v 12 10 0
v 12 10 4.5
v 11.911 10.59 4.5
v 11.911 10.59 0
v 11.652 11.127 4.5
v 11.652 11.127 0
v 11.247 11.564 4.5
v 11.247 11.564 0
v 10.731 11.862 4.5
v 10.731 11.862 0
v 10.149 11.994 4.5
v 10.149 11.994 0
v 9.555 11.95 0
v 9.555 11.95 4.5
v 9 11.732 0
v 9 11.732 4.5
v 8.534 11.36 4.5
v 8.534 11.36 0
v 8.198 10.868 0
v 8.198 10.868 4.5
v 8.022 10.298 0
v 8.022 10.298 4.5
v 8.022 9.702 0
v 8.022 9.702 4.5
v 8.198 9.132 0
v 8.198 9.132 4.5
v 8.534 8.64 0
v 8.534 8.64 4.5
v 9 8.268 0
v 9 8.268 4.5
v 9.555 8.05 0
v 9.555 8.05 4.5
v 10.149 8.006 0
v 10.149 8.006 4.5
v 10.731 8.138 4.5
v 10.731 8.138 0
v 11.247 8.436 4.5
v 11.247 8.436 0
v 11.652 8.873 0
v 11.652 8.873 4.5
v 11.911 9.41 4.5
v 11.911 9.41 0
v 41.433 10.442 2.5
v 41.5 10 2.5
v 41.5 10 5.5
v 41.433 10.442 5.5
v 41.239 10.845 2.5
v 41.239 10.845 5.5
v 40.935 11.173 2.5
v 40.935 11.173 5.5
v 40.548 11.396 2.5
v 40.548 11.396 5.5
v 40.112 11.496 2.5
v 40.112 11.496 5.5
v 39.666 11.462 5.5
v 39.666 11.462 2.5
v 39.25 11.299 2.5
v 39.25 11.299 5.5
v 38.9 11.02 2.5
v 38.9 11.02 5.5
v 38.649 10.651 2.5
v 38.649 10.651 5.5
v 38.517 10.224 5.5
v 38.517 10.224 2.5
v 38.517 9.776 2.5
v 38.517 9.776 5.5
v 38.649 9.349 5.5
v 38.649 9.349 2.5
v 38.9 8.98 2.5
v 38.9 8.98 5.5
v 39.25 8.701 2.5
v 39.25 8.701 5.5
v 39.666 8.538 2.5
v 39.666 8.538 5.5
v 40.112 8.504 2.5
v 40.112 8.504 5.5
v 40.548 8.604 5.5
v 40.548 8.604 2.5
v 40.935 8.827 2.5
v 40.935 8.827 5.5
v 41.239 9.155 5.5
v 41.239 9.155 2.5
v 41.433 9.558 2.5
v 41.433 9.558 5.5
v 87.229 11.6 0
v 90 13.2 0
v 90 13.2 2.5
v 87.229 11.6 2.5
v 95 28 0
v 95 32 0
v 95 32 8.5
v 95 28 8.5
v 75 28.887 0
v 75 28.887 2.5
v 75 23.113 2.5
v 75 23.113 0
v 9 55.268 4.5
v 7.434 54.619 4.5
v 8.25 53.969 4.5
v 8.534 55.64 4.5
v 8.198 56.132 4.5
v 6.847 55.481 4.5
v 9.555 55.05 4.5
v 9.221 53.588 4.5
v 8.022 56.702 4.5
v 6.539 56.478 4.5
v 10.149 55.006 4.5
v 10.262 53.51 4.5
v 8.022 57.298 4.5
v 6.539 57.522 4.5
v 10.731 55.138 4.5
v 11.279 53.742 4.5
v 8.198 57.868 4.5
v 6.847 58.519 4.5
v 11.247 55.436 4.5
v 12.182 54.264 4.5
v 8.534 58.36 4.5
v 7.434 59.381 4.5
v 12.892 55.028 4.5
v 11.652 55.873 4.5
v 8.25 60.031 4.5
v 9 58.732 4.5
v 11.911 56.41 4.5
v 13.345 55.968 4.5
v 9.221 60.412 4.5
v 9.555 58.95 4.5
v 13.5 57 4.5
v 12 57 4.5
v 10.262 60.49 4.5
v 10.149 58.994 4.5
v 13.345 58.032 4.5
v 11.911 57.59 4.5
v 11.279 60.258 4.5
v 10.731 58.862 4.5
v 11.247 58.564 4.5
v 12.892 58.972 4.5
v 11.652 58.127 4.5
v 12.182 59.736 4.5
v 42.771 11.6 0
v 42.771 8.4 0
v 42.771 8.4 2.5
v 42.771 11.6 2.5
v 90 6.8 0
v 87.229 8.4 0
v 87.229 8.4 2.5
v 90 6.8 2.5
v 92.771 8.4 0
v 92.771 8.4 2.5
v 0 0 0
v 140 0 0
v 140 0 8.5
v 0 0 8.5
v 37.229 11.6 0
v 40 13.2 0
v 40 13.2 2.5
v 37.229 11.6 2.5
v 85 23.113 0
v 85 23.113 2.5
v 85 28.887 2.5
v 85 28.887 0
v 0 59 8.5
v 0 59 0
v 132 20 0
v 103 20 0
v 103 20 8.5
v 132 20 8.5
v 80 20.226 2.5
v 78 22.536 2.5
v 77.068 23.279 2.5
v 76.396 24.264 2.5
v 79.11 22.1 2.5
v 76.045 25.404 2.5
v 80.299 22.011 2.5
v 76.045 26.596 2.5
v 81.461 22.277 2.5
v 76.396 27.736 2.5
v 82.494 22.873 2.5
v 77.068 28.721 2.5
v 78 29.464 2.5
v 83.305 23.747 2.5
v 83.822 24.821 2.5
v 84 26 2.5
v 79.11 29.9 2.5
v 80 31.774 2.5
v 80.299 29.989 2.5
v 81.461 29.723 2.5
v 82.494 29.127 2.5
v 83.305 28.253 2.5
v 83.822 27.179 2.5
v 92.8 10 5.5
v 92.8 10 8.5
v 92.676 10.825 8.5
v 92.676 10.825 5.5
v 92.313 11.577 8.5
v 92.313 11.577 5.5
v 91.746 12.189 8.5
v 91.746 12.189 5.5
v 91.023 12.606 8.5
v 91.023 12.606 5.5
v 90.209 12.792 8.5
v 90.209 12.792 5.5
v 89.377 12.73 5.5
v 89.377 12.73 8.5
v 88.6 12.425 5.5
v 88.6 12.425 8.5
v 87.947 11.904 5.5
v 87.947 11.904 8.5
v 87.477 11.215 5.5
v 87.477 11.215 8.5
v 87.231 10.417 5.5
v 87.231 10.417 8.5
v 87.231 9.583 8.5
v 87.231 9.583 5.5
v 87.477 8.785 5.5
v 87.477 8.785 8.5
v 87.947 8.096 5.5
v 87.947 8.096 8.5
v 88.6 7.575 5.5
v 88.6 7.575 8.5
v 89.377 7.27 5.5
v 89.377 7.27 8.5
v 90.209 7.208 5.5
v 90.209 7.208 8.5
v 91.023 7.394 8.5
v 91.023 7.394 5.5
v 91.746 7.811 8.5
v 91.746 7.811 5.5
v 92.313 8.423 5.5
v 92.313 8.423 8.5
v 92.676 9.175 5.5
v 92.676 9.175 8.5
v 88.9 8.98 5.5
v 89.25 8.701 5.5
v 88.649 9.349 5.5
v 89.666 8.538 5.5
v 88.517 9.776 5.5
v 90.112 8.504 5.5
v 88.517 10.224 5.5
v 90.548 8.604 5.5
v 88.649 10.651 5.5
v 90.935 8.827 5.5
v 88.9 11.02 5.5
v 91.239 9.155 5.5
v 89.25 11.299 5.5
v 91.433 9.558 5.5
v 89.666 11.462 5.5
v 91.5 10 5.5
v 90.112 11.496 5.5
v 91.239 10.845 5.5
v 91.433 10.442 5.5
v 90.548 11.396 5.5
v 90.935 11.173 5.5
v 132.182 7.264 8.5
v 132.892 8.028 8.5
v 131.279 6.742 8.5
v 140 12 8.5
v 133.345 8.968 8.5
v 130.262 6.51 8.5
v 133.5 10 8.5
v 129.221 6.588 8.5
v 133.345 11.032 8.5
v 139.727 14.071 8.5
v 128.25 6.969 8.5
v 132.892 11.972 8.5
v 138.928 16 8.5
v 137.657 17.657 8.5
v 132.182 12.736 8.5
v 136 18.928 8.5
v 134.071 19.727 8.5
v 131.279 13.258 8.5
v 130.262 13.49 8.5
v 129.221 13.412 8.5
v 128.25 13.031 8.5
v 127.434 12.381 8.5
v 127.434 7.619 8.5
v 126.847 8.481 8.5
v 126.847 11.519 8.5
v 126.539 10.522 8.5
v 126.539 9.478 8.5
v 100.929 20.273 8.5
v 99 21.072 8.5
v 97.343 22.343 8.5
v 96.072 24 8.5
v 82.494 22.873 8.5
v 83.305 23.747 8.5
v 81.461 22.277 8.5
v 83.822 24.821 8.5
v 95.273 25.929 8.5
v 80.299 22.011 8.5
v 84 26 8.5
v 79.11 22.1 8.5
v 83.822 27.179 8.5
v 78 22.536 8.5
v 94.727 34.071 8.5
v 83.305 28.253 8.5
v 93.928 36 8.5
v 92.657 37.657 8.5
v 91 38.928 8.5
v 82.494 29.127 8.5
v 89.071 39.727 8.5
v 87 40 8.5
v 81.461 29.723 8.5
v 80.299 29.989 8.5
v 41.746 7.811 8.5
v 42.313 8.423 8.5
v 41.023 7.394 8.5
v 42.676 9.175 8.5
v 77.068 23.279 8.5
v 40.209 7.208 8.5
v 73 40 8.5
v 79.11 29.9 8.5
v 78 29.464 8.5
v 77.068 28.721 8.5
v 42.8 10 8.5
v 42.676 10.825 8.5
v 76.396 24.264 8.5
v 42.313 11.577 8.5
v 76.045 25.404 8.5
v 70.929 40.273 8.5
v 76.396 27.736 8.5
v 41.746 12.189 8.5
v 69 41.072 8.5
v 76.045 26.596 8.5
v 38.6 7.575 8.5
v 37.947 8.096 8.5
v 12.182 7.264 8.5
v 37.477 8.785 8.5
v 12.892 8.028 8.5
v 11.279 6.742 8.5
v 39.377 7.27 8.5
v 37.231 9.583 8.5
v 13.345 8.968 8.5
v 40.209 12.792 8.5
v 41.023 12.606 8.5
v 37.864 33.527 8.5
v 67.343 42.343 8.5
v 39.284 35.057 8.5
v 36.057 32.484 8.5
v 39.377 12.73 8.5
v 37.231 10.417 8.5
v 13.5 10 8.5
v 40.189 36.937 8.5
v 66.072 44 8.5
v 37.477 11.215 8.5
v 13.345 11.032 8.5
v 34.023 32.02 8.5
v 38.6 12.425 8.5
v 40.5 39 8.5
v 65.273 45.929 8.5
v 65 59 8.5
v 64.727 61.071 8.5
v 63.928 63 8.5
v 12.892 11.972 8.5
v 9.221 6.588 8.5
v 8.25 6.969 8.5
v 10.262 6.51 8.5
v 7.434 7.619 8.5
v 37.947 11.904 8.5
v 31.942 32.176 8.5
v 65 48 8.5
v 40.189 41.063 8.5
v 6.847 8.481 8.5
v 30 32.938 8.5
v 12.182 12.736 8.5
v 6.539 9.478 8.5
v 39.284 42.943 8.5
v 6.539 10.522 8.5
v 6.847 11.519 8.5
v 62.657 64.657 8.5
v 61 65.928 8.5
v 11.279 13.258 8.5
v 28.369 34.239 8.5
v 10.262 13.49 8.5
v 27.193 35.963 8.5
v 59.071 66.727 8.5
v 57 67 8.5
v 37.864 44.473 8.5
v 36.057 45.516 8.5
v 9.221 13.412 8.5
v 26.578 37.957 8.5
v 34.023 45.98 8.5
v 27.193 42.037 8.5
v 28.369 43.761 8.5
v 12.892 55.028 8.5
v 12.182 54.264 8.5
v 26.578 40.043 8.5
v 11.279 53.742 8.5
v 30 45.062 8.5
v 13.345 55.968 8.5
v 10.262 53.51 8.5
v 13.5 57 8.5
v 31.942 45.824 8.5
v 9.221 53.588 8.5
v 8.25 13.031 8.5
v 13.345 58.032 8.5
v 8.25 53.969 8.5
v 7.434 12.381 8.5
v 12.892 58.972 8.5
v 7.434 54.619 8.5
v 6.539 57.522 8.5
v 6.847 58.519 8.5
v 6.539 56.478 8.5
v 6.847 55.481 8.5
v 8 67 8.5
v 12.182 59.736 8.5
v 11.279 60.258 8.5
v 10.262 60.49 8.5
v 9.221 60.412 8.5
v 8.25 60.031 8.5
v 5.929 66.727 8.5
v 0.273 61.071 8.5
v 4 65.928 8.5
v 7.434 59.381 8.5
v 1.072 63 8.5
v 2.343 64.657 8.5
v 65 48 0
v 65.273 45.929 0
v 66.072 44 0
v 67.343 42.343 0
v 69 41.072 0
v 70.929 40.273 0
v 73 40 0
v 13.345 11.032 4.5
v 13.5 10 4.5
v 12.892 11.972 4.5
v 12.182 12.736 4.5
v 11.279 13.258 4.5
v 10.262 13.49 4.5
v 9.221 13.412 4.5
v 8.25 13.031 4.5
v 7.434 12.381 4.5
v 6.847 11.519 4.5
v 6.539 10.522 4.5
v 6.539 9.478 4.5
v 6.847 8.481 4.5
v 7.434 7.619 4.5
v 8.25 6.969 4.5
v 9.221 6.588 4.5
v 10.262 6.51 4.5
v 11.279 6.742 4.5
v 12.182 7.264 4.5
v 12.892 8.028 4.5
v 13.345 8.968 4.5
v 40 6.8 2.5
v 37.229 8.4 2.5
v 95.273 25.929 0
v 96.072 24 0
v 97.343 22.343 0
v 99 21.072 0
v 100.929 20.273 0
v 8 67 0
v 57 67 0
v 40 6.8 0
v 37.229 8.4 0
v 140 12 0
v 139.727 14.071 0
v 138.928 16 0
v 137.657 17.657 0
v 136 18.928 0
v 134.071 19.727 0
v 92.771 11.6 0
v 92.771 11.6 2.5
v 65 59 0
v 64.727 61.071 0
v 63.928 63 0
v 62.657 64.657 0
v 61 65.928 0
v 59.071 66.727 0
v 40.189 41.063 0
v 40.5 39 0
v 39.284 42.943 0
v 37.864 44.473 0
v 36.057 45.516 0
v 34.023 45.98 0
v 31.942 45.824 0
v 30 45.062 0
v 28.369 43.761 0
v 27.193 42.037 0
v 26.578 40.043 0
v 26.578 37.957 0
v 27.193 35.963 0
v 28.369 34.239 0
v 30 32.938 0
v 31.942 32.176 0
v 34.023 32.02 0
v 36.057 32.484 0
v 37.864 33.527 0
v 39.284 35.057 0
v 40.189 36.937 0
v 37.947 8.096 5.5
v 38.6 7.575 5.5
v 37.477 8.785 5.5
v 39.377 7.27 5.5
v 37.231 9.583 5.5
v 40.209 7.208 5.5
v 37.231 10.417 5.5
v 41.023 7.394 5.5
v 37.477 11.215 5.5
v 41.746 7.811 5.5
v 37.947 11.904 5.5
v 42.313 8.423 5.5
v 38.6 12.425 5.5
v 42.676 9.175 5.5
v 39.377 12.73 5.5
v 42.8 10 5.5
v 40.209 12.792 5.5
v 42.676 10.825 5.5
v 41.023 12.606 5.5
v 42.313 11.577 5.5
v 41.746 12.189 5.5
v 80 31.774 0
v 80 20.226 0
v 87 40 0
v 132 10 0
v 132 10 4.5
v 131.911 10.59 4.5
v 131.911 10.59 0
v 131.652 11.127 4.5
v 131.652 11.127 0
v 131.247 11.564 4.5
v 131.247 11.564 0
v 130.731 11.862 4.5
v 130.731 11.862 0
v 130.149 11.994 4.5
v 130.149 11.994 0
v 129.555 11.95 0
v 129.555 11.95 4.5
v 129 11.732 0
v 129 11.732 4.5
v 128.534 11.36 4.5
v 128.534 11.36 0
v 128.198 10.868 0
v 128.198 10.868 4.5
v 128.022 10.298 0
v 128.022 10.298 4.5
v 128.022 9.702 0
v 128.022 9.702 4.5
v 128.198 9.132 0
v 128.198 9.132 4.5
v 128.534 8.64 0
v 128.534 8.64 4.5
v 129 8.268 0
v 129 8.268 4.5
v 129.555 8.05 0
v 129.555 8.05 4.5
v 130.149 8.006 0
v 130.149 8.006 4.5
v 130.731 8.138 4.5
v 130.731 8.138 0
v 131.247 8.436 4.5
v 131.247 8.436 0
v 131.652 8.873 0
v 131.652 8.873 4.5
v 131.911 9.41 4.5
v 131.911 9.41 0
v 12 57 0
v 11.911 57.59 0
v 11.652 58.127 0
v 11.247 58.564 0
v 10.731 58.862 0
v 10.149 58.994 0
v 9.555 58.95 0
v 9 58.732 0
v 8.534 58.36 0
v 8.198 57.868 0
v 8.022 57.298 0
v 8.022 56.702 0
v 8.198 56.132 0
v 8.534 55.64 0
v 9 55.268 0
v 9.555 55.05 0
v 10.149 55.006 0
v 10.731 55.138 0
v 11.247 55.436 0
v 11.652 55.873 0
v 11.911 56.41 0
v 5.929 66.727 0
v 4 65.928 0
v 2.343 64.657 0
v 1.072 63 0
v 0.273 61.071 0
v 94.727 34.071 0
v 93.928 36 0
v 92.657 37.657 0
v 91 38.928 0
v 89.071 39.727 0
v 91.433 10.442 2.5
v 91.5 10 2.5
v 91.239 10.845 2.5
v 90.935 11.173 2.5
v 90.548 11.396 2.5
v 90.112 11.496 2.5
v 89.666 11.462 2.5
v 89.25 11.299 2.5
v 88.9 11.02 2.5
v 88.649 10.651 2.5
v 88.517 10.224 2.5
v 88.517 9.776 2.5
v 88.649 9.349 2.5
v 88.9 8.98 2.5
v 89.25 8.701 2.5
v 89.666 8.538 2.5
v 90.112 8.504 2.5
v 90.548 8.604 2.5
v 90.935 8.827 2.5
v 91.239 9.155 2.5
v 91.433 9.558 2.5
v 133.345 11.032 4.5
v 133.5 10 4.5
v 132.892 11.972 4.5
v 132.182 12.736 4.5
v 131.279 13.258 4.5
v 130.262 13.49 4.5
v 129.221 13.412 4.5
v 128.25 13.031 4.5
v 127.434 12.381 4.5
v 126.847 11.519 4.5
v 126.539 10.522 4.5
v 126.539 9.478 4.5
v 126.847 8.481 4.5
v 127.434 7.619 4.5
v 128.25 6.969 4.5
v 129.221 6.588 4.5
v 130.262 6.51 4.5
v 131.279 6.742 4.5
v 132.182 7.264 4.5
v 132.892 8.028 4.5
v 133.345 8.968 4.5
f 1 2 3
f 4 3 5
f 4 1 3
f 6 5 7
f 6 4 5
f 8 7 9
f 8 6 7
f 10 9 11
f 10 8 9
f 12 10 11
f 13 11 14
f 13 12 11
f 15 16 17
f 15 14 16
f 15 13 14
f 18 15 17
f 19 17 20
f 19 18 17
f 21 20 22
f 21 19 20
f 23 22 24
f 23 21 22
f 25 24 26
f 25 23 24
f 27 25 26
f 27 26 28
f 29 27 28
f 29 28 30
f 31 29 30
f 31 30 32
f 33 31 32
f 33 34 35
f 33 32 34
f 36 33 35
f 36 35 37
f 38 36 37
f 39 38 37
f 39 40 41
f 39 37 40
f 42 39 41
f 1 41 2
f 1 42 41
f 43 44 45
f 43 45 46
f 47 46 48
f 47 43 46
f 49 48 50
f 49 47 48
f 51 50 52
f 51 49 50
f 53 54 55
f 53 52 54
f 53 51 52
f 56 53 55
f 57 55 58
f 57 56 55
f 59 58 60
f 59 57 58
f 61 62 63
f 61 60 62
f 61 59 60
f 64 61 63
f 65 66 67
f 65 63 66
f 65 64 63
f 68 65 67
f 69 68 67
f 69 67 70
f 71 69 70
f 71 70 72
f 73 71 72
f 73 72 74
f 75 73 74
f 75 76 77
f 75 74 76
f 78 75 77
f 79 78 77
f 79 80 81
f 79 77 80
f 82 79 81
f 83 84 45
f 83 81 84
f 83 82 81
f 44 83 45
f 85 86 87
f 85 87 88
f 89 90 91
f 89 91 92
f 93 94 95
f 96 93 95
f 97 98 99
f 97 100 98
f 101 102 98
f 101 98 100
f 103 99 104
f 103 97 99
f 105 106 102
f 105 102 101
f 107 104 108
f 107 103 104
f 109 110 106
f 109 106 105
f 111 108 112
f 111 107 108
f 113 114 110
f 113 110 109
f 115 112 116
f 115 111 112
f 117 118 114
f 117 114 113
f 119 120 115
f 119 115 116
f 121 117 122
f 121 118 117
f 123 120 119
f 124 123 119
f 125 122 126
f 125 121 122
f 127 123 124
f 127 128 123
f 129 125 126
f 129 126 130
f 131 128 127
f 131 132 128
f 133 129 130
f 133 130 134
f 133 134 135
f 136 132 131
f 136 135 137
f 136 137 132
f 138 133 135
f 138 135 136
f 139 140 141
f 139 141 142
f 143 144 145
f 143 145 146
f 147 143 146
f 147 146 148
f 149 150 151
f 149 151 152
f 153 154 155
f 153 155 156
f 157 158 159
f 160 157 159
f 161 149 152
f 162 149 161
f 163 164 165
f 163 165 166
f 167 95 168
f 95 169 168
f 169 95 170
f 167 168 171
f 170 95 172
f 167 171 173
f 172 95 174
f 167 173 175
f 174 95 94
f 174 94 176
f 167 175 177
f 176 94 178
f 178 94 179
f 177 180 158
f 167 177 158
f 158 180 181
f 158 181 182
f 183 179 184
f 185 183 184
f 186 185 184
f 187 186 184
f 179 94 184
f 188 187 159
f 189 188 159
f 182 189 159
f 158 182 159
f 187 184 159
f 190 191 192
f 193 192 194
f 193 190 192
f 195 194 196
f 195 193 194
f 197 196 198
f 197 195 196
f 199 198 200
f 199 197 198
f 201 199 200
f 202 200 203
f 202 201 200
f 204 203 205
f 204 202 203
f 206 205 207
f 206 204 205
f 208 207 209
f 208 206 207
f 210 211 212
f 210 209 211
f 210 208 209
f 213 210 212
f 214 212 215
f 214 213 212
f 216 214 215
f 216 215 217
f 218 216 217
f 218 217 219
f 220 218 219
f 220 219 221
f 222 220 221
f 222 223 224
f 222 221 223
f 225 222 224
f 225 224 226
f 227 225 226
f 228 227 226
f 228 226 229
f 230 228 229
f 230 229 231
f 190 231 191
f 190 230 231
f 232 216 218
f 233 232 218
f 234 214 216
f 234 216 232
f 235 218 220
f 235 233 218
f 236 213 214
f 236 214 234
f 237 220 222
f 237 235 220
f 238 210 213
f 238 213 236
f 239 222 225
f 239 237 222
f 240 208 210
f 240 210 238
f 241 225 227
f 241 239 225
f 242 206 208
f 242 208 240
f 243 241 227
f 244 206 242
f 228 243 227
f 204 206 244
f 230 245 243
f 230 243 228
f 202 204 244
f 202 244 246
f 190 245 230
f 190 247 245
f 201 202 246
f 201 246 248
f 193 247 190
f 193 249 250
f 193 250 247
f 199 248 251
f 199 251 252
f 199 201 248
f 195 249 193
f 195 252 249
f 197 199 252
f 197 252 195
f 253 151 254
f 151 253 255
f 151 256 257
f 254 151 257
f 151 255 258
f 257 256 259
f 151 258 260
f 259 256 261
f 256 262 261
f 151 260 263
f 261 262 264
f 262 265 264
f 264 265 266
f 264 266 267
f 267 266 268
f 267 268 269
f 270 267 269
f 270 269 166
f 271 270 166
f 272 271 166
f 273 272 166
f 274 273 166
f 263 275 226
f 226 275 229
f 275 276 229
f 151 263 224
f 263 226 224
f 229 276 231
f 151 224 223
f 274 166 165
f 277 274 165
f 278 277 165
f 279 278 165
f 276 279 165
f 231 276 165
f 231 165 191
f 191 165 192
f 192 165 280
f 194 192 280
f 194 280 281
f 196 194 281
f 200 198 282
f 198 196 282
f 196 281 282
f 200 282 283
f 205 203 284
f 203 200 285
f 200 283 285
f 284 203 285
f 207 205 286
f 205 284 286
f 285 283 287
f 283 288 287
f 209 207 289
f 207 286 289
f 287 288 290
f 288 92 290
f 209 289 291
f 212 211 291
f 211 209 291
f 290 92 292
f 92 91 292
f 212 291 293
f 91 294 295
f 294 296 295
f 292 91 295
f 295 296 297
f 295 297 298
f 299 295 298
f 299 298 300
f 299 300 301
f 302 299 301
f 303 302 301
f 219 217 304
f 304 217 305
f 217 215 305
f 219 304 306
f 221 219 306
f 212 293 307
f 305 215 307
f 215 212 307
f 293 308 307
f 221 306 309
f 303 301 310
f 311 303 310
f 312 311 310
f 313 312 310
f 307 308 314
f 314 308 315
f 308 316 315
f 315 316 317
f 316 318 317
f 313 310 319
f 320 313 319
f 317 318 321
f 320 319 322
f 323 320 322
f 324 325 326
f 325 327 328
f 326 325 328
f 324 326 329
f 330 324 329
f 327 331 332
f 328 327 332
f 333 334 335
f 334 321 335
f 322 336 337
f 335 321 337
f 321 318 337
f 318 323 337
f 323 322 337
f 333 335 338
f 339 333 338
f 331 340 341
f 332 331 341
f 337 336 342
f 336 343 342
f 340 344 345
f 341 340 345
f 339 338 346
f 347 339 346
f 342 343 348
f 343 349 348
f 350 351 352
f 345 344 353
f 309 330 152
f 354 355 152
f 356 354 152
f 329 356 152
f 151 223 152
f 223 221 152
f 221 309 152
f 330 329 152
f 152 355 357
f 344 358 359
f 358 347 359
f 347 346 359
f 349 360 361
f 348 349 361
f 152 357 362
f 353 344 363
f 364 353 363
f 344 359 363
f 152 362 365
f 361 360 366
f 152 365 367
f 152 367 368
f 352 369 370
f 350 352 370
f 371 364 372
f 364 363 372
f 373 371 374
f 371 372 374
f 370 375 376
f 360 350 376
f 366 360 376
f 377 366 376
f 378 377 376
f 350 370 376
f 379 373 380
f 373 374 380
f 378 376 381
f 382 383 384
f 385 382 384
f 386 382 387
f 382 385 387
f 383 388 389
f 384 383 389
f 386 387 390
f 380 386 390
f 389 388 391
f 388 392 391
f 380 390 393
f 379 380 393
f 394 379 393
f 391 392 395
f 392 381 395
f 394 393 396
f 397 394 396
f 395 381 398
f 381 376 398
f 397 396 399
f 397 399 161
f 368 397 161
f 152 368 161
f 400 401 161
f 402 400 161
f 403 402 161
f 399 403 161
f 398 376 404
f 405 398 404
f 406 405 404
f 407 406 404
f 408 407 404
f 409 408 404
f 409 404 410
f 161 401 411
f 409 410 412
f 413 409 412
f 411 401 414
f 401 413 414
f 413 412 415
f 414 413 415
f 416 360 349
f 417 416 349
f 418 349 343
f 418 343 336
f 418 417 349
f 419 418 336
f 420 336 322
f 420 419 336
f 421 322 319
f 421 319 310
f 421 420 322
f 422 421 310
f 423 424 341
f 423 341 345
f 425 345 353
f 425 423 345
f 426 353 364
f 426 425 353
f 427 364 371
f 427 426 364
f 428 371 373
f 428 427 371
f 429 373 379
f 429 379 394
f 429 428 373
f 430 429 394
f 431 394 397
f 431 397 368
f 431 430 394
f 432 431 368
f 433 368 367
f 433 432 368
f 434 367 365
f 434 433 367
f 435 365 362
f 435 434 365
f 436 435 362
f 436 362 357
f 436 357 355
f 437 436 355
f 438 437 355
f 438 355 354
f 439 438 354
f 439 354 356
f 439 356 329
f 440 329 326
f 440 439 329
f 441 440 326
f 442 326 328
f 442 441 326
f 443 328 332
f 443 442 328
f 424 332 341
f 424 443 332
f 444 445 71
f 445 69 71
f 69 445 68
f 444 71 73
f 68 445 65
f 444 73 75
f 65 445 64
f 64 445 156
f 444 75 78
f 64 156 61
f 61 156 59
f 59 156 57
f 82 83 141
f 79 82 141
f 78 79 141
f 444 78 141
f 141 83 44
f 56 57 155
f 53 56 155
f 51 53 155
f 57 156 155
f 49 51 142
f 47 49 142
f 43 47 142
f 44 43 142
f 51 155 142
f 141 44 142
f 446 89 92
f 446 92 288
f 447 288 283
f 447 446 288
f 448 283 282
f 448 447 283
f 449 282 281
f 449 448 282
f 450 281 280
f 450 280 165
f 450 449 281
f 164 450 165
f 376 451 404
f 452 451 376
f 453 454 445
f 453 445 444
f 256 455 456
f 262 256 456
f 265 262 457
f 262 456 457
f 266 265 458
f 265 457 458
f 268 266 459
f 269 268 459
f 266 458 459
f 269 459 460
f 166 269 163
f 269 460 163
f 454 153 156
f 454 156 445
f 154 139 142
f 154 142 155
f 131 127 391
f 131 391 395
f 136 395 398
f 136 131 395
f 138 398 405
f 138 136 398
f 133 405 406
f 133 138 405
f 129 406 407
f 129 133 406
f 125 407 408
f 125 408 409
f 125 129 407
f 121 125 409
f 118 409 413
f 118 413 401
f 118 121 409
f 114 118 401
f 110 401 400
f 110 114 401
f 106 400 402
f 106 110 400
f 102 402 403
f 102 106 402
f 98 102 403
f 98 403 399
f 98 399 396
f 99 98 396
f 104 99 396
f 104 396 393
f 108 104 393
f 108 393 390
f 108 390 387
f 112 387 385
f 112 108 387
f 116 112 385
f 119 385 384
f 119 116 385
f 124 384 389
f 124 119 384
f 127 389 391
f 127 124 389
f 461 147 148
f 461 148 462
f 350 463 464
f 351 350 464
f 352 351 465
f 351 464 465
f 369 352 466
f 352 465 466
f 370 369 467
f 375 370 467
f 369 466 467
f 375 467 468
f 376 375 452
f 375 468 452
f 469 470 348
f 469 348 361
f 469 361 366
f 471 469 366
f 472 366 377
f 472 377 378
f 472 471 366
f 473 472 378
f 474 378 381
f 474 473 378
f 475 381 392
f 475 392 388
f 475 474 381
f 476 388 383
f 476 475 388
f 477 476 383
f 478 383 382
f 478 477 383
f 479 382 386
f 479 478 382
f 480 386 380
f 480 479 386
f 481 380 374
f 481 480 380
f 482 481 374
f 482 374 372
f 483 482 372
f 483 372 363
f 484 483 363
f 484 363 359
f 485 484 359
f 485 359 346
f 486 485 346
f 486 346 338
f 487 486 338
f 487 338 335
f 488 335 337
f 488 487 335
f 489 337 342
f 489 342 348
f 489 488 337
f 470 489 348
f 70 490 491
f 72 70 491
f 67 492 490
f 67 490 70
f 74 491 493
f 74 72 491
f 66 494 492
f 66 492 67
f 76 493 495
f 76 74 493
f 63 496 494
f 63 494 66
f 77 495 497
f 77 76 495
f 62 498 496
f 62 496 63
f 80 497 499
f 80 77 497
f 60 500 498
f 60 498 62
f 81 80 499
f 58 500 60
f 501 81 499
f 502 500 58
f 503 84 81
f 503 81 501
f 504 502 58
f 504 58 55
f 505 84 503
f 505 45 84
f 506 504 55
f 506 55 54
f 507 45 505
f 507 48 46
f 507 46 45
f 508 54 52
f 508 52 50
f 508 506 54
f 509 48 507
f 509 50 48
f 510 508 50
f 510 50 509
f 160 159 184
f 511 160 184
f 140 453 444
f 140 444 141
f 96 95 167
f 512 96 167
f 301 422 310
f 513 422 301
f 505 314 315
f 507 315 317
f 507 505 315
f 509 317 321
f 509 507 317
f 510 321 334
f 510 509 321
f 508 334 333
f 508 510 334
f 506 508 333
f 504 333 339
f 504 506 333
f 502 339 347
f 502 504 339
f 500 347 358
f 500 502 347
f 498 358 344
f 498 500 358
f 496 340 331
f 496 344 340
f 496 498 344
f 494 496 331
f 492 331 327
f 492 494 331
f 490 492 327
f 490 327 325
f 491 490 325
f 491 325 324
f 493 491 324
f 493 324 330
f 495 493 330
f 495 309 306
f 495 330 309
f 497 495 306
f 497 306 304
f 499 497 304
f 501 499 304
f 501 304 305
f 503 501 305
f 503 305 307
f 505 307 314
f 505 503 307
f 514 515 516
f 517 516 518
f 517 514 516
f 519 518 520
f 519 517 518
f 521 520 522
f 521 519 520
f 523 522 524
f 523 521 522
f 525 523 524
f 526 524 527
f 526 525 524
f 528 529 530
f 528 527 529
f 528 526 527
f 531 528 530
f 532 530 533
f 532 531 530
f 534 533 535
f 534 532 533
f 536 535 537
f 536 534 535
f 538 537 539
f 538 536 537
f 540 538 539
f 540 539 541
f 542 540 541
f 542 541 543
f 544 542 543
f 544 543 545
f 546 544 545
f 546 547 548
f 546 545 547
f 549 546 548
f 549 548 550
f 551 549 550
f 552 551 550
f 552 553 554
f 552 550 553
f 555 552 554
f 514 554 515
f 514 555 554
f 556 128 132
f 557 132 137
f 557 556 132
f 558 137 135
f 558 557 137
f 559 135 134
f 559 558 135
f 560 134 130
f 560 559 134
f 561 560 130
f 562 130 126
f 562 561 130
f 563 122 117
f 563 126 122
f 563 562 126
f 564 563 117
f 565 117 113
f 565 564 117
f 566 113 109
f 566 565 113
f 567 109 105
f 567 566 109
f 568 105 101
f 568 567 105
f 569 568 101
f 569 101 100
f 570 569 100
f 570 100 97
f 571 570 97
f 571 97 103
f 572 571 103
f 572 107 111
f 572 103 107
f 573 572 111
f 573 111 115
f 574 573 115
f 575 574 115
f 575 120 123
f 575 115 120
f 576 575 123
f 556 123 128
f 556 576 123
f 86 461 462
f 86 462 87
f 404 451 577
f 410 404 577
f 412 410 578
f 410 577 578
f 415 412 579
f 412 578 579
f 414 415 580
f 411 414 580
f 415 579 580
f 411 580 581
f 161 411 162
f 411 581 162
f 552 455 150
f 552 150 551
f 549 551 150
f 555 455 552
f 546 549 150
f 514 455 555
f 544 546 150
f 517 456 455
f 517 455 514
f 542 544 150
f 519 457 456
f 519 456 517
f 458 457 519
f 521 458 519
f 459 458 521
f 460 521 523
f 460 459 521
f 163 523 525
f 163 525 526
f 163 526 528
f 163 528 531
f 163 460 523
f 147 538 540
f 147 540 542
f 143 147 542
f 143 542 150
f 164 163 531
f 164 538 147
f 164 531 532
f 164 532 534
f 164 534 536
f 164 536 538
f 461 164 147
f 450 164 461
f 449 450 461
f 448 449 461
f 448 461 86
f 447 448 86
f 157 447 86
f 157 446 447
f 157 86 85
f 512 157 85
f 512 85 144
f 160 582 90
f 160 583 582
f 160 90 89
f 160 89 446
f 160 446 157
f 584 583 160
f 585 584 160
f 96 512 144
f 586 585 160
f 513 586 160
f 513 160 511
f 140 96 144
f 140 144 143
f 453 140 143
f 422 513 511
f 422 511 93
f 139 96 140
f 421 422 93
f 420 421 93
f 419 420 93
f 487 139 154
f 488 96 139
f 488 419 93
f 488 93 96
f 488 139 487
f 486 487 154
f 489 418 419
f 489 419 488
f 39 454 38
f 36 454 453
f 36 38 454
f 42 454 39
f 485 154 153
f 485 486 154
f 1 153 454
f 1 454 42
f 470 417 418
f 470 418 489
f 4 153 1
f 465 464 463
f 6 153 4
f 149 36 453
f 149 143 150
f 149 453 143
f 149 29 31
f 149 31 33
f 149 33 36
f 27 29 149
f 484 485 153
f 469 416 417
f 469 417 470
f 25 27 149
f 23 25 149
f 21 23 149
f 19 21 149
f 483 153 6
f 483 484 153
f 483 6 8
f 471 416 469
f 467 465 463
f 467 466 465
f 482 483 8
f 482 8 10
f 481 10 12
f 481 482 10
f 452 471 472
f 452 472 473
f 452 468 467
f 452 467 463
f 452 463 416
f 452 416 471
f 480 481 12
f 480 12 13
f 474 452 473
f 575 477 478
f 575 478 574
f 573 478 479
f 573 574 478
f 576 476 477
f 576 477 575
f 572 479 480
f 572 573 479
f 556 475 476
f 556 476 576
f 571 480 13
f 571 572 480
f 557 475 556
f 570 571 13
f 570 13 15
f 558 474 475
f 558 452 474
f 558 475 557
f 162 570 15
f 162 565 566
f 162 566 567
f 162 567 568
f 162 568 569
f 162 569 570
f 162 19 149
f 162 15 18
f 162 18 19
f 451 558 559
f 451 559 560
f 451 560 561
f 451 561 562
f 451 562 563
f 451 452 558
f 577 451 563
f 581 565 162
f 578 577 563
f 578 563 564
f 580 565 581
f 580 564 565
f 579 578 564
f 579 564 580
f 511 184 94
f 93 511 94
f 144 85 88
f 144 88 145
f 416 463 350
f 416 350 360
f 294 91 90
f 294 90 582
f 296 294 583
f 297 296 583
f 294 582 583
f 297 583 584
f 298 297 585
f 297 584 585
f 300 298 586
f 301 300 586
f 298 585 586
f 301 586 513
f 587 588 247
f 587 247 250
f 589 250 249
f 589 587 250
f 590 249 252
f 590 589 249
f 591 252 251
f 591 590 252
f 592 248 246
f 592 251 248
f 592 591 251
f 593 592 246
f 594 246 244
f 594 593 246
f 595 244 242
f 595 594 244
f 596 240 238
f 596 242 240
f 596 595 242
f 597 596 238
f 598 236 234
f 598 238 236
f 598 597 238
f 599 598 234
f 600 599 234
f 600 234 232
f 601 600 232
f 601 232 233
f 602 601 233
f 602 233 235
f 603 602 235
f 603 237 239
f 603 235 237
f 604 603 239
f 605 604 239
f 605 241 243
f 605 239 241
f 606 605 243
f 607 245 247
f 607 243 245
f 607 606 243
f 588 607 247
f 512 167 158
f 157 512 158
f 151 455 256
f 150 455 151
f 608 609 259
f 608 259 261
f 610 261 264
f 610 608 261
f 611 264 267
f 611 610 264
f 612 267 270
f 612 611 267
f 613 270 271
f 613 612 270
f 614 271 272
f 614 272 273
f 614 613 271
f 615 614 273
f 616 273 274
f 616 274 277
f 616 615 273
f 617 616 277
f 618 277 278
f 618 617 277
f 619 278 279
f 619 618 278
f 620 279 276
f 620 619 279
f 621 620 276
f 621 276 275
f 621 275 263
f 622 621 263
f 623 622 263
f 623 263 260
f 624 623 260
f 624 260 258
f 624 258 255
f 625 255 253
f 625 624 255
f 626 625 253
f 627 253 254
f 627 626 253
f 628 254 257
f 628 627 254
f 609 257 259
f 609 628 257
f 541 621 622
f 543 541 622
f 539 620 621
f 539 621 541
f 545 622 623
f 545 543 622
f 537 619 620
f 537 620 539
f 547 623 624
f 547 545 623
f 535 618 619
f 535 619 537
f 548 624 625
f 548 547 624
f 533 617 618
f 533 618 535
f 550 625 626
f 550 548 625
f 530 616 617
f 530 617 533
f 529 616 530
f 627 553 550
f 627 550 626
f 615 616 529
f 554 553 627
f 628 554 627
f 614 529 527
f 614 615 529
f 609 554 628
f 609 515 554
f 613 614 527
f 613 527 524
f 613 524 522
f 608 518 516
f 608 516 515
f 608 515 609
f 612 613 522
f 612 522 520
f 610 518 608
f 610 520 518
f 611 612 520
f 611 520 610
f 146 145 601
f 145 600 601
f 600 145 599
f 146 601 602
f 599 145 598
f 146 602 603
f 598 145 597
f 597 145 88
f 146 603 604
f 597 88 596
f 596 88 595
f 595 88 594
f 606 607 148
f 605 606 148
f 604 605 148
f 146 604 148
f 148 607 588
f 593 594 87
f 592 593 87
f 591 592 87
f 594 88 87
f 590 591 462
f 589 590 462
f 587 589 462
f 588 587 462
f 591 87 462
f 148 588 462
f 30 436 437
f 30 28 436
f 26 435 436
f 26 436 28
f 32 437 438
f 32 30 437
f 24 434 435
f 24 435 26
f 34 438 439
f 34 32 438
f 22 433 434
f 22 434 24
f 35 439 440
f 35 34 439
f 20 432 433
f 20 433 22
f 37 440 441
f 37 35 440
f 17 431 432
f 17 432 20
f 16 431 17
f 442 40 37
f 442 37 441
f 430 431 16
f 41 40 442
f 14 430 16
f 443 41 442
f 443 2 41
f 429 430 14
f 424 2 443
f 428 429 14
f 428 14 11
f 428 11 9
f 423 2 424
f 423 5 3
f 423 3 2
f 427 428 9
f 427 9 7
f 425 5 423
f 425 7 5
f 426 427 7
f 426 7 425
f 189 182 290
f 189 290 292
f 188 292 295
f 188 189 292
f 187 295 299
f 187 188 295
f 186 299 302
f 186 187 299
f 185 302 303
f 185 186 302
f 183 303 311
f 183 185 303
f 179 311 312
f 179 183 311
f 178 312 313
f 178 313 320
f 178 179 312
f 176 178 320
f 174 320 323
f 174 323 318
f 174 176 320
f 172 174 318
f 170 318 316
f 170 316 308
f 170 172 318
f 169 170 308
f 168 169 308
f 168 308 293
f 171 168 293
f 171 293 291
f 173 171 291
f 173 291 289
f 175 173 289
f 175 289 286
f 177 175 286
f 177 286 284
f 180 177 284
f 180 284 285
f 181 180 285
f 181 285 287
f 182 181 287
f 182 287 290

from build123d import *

# Parameters (mm, degrees)
PAD002_DEPTH      = 2.5
CYLINDER003_R     = 2.8
CYLINDER003_DEPTH = 15
CYLINDER004_R     = 1.5
CYLINDER004_DEPTH = 8.5
CYLINDER001_R     = 3.5
CYLINDER001_DEPTH = 4
CYLINDER_R        = 3.5
CYLINDER_DEPTH    = 4
CYLINDER002_R     = 3.5
CYLINDER002_DEPTH = 4
PAD001_DEPTH      = 2.5
PAD003_DEPTH      = 2.5
CYLINDER006_R     = 2.8
CYLINDER006_DEPTH = 15
CYLINDER005_R     = 1.5
CYLINDER005_DEPTH = 8.5
SKETCH_R          = 2
SKETCH_R_2        = 7
SKETCH_R_3        = 4
PAD_DEPTH         = 8.5


with BuildPart() as body002:
    # Sketch002 → Pad002 (new body)
    with BuildSketch(Plane.XY):
        Polygon((0, -3.2), (2.771281, -1.6), (2.771281, 1.6), (0, 3.2), (-2.771281, 1.6), (-2.771281, -1.6), align=None)
    extrude(amount=PAD002_DEPTH)


with BuildPart() as cylinder003:
    # Cylinder003 → Cylinder003 (new body)
    with BuildSketch(Plane.XY.offset(5.5)):
        Circle(CYLINDER003_R)
    extrude(amount=CYLINDER003_DEPTH)


with BuildPart() as fusion001:
    # Cylinder004 → Cylinder004 (new body)
    with BuildSketch(Plane.XY):
        Circle(CYLINDER004_R)
    extrude(amount=CYLINDER004_DEPTH)

    # Fusion001: union Body002, Cylinder003
    add(body002.part)
    add(cylinder003.part)


with BuildPart() as fusion001_1:
    # Fusion001 placement: moved
    add(fusion001.part.moved(Location((40, 10, 0))))


with BuildPart() as cylinder001:
    # Cylinder001 → Cylinder001 (new body)
    with BuildSketch(Plane(origin=(130, 10, 4.5), x_dir=(1, 0, 0), z_dir=(0, 0, 1))):
        Circle(CYLINDER001_R)
    extrude(amount=CYLINDER001_DEPTH)


with BuildPart() as cylinder:
    # Cylinder → Cylinder (new body)
    with BuildSketch(Plane(origin=(10, 10, 4.5), x_dir=(1, 0, 0), z_dir=(0, 0, 1))):
        Circle(CYLINDER_R)
    extrude(amount=CYLINDER_DEPTH)


with BuildPart() as cylinder002:
    # Cylinder002 → Cylinder002 (new body)
    with BuildSketch(Plane(origin=(10, 57, 4.5), x_dir=(1, 0, 0), z_dir=(0, 0, 1))):
        Circle(CYLINDER002_R)
    extrude(amount=CYLINDER002_DEPTH)


with BuildPart() as fusion:
    # Sketch001 → Pad001 (new body, symmetric)
    with BuildSketch(Plane.XY):
        Polygon((0, -5.773503), (5, -2.886751), (5, 2.886751), (0, 5.773503), (-5, 2.886751), (-5, -2.886751), align=None)
    extrude(amount=PAD001_DEPTH, both=True)


with BuildPart() as fusion_1:
    # Body001 placement: moved
    add(fusion.part.moved(Location((80, 26, 0))))

    # Fusion: union Cylinder001, Cylinder, Cylinder002
    add(cylinder001.part)
    add(cylinder.part)
    add(cylinder002.part)


with BuildPart() as body003:
    # Sketch003 → Pad003 (new body)
    with BuildSketch(Plane.XY):
        Polygon((0, -3.2), (2.771281, -1.6), (2.771281, 1.6), (0, 3.2), (-2.771281, 1.6), (-2.771281, -1.6), align=None)
    extrude(amount=PAD003_DEPTH)


with BuildPart() as cylinder006:
    # Cylinder006 → Cylinder006 (new body)
    with BuildSketch(Plane.XY.offset(5.5)):
        Circle(CYLINDER006_R)
    extrude(amount=CYLINDER006_DEPTH)


with BuildPart() as fusion003:
    # Cylinder005 → Cylinder005 (new body)
    with BuildSketch(Plane.XY):
        Circle(CYLINDER005_R)
    extrude(amount=CYLINDER005_DEPTH)

    # Fusion002: union Body003, Cylinder006
    add(body003.part)
    add(cylinder006.part)


with BuildPart() as fusion003_1:
    # Fusion002 placement: moved
    add(fusion003.part.moved(Location((90, 10, 0))))

    # Fusion003: union Fusion001, Fusion
    add(fusion001_1.part)
    add(fusion_1.part)


with BuildPart() as cut:
    # Sketch → Pad (new body)
    with BuildSketch(Plane.XY):
        with BuildLine():
            Line((0, 0), (0, 59))
            ThreePointArc((8, 67), (2.343146, 64.656854), (0, 59))
            Line((8, 67), (57, 67))
            ThreePointArc((65, 59), (62.656854, 64.656854), (57, 67))
            Line((65, 59), (65, 48))
            ThreePointArc((65, 48), (67.343146, 42.343146), (73, 40))
            Line((73, 40), (87, 40))
            ThreePointArc((95, 32), (92.656854, 37.656854), (87, 40))
            Line((95, 32), (95, 28))
            ThreePointArc((95, 28), (97.343146, 22.343146), (103, 20))
            Line((103, 20), (132, 20))
            ThreePointArc((140, 12), (137.656854, 17.656854), (132, 20))
            Line((140, 12), (140, 0))
            Line((140, 0), (0, 0))
        make_face()
        with Locations((10, 10)):
            Circle(SKETCH_R, mode=Mode.SUBTRACT)
        with Locations((10, 57)):
            Circle(SKETCH_R, mode=Mode.SUBTRACT)
        with Locations((33.5, 39)):
            Circle(SKETCH_R_2, mode=Mode.SUBTRACT)
        with Locations((80, 26)):
            Circle(SKETCH_R_3, mode=Mode.SUBTRACT)
        with Locations((130, 10)):
            Circle(SKETCH_R, mode=Mode.SUBTRACT)
    extrude(amount=PAD_DEPTH)

    # Cut: cut Fusion003
    add(fusion003_1.part, mode=Mode.SUBTRACT)


solid = cut.part
